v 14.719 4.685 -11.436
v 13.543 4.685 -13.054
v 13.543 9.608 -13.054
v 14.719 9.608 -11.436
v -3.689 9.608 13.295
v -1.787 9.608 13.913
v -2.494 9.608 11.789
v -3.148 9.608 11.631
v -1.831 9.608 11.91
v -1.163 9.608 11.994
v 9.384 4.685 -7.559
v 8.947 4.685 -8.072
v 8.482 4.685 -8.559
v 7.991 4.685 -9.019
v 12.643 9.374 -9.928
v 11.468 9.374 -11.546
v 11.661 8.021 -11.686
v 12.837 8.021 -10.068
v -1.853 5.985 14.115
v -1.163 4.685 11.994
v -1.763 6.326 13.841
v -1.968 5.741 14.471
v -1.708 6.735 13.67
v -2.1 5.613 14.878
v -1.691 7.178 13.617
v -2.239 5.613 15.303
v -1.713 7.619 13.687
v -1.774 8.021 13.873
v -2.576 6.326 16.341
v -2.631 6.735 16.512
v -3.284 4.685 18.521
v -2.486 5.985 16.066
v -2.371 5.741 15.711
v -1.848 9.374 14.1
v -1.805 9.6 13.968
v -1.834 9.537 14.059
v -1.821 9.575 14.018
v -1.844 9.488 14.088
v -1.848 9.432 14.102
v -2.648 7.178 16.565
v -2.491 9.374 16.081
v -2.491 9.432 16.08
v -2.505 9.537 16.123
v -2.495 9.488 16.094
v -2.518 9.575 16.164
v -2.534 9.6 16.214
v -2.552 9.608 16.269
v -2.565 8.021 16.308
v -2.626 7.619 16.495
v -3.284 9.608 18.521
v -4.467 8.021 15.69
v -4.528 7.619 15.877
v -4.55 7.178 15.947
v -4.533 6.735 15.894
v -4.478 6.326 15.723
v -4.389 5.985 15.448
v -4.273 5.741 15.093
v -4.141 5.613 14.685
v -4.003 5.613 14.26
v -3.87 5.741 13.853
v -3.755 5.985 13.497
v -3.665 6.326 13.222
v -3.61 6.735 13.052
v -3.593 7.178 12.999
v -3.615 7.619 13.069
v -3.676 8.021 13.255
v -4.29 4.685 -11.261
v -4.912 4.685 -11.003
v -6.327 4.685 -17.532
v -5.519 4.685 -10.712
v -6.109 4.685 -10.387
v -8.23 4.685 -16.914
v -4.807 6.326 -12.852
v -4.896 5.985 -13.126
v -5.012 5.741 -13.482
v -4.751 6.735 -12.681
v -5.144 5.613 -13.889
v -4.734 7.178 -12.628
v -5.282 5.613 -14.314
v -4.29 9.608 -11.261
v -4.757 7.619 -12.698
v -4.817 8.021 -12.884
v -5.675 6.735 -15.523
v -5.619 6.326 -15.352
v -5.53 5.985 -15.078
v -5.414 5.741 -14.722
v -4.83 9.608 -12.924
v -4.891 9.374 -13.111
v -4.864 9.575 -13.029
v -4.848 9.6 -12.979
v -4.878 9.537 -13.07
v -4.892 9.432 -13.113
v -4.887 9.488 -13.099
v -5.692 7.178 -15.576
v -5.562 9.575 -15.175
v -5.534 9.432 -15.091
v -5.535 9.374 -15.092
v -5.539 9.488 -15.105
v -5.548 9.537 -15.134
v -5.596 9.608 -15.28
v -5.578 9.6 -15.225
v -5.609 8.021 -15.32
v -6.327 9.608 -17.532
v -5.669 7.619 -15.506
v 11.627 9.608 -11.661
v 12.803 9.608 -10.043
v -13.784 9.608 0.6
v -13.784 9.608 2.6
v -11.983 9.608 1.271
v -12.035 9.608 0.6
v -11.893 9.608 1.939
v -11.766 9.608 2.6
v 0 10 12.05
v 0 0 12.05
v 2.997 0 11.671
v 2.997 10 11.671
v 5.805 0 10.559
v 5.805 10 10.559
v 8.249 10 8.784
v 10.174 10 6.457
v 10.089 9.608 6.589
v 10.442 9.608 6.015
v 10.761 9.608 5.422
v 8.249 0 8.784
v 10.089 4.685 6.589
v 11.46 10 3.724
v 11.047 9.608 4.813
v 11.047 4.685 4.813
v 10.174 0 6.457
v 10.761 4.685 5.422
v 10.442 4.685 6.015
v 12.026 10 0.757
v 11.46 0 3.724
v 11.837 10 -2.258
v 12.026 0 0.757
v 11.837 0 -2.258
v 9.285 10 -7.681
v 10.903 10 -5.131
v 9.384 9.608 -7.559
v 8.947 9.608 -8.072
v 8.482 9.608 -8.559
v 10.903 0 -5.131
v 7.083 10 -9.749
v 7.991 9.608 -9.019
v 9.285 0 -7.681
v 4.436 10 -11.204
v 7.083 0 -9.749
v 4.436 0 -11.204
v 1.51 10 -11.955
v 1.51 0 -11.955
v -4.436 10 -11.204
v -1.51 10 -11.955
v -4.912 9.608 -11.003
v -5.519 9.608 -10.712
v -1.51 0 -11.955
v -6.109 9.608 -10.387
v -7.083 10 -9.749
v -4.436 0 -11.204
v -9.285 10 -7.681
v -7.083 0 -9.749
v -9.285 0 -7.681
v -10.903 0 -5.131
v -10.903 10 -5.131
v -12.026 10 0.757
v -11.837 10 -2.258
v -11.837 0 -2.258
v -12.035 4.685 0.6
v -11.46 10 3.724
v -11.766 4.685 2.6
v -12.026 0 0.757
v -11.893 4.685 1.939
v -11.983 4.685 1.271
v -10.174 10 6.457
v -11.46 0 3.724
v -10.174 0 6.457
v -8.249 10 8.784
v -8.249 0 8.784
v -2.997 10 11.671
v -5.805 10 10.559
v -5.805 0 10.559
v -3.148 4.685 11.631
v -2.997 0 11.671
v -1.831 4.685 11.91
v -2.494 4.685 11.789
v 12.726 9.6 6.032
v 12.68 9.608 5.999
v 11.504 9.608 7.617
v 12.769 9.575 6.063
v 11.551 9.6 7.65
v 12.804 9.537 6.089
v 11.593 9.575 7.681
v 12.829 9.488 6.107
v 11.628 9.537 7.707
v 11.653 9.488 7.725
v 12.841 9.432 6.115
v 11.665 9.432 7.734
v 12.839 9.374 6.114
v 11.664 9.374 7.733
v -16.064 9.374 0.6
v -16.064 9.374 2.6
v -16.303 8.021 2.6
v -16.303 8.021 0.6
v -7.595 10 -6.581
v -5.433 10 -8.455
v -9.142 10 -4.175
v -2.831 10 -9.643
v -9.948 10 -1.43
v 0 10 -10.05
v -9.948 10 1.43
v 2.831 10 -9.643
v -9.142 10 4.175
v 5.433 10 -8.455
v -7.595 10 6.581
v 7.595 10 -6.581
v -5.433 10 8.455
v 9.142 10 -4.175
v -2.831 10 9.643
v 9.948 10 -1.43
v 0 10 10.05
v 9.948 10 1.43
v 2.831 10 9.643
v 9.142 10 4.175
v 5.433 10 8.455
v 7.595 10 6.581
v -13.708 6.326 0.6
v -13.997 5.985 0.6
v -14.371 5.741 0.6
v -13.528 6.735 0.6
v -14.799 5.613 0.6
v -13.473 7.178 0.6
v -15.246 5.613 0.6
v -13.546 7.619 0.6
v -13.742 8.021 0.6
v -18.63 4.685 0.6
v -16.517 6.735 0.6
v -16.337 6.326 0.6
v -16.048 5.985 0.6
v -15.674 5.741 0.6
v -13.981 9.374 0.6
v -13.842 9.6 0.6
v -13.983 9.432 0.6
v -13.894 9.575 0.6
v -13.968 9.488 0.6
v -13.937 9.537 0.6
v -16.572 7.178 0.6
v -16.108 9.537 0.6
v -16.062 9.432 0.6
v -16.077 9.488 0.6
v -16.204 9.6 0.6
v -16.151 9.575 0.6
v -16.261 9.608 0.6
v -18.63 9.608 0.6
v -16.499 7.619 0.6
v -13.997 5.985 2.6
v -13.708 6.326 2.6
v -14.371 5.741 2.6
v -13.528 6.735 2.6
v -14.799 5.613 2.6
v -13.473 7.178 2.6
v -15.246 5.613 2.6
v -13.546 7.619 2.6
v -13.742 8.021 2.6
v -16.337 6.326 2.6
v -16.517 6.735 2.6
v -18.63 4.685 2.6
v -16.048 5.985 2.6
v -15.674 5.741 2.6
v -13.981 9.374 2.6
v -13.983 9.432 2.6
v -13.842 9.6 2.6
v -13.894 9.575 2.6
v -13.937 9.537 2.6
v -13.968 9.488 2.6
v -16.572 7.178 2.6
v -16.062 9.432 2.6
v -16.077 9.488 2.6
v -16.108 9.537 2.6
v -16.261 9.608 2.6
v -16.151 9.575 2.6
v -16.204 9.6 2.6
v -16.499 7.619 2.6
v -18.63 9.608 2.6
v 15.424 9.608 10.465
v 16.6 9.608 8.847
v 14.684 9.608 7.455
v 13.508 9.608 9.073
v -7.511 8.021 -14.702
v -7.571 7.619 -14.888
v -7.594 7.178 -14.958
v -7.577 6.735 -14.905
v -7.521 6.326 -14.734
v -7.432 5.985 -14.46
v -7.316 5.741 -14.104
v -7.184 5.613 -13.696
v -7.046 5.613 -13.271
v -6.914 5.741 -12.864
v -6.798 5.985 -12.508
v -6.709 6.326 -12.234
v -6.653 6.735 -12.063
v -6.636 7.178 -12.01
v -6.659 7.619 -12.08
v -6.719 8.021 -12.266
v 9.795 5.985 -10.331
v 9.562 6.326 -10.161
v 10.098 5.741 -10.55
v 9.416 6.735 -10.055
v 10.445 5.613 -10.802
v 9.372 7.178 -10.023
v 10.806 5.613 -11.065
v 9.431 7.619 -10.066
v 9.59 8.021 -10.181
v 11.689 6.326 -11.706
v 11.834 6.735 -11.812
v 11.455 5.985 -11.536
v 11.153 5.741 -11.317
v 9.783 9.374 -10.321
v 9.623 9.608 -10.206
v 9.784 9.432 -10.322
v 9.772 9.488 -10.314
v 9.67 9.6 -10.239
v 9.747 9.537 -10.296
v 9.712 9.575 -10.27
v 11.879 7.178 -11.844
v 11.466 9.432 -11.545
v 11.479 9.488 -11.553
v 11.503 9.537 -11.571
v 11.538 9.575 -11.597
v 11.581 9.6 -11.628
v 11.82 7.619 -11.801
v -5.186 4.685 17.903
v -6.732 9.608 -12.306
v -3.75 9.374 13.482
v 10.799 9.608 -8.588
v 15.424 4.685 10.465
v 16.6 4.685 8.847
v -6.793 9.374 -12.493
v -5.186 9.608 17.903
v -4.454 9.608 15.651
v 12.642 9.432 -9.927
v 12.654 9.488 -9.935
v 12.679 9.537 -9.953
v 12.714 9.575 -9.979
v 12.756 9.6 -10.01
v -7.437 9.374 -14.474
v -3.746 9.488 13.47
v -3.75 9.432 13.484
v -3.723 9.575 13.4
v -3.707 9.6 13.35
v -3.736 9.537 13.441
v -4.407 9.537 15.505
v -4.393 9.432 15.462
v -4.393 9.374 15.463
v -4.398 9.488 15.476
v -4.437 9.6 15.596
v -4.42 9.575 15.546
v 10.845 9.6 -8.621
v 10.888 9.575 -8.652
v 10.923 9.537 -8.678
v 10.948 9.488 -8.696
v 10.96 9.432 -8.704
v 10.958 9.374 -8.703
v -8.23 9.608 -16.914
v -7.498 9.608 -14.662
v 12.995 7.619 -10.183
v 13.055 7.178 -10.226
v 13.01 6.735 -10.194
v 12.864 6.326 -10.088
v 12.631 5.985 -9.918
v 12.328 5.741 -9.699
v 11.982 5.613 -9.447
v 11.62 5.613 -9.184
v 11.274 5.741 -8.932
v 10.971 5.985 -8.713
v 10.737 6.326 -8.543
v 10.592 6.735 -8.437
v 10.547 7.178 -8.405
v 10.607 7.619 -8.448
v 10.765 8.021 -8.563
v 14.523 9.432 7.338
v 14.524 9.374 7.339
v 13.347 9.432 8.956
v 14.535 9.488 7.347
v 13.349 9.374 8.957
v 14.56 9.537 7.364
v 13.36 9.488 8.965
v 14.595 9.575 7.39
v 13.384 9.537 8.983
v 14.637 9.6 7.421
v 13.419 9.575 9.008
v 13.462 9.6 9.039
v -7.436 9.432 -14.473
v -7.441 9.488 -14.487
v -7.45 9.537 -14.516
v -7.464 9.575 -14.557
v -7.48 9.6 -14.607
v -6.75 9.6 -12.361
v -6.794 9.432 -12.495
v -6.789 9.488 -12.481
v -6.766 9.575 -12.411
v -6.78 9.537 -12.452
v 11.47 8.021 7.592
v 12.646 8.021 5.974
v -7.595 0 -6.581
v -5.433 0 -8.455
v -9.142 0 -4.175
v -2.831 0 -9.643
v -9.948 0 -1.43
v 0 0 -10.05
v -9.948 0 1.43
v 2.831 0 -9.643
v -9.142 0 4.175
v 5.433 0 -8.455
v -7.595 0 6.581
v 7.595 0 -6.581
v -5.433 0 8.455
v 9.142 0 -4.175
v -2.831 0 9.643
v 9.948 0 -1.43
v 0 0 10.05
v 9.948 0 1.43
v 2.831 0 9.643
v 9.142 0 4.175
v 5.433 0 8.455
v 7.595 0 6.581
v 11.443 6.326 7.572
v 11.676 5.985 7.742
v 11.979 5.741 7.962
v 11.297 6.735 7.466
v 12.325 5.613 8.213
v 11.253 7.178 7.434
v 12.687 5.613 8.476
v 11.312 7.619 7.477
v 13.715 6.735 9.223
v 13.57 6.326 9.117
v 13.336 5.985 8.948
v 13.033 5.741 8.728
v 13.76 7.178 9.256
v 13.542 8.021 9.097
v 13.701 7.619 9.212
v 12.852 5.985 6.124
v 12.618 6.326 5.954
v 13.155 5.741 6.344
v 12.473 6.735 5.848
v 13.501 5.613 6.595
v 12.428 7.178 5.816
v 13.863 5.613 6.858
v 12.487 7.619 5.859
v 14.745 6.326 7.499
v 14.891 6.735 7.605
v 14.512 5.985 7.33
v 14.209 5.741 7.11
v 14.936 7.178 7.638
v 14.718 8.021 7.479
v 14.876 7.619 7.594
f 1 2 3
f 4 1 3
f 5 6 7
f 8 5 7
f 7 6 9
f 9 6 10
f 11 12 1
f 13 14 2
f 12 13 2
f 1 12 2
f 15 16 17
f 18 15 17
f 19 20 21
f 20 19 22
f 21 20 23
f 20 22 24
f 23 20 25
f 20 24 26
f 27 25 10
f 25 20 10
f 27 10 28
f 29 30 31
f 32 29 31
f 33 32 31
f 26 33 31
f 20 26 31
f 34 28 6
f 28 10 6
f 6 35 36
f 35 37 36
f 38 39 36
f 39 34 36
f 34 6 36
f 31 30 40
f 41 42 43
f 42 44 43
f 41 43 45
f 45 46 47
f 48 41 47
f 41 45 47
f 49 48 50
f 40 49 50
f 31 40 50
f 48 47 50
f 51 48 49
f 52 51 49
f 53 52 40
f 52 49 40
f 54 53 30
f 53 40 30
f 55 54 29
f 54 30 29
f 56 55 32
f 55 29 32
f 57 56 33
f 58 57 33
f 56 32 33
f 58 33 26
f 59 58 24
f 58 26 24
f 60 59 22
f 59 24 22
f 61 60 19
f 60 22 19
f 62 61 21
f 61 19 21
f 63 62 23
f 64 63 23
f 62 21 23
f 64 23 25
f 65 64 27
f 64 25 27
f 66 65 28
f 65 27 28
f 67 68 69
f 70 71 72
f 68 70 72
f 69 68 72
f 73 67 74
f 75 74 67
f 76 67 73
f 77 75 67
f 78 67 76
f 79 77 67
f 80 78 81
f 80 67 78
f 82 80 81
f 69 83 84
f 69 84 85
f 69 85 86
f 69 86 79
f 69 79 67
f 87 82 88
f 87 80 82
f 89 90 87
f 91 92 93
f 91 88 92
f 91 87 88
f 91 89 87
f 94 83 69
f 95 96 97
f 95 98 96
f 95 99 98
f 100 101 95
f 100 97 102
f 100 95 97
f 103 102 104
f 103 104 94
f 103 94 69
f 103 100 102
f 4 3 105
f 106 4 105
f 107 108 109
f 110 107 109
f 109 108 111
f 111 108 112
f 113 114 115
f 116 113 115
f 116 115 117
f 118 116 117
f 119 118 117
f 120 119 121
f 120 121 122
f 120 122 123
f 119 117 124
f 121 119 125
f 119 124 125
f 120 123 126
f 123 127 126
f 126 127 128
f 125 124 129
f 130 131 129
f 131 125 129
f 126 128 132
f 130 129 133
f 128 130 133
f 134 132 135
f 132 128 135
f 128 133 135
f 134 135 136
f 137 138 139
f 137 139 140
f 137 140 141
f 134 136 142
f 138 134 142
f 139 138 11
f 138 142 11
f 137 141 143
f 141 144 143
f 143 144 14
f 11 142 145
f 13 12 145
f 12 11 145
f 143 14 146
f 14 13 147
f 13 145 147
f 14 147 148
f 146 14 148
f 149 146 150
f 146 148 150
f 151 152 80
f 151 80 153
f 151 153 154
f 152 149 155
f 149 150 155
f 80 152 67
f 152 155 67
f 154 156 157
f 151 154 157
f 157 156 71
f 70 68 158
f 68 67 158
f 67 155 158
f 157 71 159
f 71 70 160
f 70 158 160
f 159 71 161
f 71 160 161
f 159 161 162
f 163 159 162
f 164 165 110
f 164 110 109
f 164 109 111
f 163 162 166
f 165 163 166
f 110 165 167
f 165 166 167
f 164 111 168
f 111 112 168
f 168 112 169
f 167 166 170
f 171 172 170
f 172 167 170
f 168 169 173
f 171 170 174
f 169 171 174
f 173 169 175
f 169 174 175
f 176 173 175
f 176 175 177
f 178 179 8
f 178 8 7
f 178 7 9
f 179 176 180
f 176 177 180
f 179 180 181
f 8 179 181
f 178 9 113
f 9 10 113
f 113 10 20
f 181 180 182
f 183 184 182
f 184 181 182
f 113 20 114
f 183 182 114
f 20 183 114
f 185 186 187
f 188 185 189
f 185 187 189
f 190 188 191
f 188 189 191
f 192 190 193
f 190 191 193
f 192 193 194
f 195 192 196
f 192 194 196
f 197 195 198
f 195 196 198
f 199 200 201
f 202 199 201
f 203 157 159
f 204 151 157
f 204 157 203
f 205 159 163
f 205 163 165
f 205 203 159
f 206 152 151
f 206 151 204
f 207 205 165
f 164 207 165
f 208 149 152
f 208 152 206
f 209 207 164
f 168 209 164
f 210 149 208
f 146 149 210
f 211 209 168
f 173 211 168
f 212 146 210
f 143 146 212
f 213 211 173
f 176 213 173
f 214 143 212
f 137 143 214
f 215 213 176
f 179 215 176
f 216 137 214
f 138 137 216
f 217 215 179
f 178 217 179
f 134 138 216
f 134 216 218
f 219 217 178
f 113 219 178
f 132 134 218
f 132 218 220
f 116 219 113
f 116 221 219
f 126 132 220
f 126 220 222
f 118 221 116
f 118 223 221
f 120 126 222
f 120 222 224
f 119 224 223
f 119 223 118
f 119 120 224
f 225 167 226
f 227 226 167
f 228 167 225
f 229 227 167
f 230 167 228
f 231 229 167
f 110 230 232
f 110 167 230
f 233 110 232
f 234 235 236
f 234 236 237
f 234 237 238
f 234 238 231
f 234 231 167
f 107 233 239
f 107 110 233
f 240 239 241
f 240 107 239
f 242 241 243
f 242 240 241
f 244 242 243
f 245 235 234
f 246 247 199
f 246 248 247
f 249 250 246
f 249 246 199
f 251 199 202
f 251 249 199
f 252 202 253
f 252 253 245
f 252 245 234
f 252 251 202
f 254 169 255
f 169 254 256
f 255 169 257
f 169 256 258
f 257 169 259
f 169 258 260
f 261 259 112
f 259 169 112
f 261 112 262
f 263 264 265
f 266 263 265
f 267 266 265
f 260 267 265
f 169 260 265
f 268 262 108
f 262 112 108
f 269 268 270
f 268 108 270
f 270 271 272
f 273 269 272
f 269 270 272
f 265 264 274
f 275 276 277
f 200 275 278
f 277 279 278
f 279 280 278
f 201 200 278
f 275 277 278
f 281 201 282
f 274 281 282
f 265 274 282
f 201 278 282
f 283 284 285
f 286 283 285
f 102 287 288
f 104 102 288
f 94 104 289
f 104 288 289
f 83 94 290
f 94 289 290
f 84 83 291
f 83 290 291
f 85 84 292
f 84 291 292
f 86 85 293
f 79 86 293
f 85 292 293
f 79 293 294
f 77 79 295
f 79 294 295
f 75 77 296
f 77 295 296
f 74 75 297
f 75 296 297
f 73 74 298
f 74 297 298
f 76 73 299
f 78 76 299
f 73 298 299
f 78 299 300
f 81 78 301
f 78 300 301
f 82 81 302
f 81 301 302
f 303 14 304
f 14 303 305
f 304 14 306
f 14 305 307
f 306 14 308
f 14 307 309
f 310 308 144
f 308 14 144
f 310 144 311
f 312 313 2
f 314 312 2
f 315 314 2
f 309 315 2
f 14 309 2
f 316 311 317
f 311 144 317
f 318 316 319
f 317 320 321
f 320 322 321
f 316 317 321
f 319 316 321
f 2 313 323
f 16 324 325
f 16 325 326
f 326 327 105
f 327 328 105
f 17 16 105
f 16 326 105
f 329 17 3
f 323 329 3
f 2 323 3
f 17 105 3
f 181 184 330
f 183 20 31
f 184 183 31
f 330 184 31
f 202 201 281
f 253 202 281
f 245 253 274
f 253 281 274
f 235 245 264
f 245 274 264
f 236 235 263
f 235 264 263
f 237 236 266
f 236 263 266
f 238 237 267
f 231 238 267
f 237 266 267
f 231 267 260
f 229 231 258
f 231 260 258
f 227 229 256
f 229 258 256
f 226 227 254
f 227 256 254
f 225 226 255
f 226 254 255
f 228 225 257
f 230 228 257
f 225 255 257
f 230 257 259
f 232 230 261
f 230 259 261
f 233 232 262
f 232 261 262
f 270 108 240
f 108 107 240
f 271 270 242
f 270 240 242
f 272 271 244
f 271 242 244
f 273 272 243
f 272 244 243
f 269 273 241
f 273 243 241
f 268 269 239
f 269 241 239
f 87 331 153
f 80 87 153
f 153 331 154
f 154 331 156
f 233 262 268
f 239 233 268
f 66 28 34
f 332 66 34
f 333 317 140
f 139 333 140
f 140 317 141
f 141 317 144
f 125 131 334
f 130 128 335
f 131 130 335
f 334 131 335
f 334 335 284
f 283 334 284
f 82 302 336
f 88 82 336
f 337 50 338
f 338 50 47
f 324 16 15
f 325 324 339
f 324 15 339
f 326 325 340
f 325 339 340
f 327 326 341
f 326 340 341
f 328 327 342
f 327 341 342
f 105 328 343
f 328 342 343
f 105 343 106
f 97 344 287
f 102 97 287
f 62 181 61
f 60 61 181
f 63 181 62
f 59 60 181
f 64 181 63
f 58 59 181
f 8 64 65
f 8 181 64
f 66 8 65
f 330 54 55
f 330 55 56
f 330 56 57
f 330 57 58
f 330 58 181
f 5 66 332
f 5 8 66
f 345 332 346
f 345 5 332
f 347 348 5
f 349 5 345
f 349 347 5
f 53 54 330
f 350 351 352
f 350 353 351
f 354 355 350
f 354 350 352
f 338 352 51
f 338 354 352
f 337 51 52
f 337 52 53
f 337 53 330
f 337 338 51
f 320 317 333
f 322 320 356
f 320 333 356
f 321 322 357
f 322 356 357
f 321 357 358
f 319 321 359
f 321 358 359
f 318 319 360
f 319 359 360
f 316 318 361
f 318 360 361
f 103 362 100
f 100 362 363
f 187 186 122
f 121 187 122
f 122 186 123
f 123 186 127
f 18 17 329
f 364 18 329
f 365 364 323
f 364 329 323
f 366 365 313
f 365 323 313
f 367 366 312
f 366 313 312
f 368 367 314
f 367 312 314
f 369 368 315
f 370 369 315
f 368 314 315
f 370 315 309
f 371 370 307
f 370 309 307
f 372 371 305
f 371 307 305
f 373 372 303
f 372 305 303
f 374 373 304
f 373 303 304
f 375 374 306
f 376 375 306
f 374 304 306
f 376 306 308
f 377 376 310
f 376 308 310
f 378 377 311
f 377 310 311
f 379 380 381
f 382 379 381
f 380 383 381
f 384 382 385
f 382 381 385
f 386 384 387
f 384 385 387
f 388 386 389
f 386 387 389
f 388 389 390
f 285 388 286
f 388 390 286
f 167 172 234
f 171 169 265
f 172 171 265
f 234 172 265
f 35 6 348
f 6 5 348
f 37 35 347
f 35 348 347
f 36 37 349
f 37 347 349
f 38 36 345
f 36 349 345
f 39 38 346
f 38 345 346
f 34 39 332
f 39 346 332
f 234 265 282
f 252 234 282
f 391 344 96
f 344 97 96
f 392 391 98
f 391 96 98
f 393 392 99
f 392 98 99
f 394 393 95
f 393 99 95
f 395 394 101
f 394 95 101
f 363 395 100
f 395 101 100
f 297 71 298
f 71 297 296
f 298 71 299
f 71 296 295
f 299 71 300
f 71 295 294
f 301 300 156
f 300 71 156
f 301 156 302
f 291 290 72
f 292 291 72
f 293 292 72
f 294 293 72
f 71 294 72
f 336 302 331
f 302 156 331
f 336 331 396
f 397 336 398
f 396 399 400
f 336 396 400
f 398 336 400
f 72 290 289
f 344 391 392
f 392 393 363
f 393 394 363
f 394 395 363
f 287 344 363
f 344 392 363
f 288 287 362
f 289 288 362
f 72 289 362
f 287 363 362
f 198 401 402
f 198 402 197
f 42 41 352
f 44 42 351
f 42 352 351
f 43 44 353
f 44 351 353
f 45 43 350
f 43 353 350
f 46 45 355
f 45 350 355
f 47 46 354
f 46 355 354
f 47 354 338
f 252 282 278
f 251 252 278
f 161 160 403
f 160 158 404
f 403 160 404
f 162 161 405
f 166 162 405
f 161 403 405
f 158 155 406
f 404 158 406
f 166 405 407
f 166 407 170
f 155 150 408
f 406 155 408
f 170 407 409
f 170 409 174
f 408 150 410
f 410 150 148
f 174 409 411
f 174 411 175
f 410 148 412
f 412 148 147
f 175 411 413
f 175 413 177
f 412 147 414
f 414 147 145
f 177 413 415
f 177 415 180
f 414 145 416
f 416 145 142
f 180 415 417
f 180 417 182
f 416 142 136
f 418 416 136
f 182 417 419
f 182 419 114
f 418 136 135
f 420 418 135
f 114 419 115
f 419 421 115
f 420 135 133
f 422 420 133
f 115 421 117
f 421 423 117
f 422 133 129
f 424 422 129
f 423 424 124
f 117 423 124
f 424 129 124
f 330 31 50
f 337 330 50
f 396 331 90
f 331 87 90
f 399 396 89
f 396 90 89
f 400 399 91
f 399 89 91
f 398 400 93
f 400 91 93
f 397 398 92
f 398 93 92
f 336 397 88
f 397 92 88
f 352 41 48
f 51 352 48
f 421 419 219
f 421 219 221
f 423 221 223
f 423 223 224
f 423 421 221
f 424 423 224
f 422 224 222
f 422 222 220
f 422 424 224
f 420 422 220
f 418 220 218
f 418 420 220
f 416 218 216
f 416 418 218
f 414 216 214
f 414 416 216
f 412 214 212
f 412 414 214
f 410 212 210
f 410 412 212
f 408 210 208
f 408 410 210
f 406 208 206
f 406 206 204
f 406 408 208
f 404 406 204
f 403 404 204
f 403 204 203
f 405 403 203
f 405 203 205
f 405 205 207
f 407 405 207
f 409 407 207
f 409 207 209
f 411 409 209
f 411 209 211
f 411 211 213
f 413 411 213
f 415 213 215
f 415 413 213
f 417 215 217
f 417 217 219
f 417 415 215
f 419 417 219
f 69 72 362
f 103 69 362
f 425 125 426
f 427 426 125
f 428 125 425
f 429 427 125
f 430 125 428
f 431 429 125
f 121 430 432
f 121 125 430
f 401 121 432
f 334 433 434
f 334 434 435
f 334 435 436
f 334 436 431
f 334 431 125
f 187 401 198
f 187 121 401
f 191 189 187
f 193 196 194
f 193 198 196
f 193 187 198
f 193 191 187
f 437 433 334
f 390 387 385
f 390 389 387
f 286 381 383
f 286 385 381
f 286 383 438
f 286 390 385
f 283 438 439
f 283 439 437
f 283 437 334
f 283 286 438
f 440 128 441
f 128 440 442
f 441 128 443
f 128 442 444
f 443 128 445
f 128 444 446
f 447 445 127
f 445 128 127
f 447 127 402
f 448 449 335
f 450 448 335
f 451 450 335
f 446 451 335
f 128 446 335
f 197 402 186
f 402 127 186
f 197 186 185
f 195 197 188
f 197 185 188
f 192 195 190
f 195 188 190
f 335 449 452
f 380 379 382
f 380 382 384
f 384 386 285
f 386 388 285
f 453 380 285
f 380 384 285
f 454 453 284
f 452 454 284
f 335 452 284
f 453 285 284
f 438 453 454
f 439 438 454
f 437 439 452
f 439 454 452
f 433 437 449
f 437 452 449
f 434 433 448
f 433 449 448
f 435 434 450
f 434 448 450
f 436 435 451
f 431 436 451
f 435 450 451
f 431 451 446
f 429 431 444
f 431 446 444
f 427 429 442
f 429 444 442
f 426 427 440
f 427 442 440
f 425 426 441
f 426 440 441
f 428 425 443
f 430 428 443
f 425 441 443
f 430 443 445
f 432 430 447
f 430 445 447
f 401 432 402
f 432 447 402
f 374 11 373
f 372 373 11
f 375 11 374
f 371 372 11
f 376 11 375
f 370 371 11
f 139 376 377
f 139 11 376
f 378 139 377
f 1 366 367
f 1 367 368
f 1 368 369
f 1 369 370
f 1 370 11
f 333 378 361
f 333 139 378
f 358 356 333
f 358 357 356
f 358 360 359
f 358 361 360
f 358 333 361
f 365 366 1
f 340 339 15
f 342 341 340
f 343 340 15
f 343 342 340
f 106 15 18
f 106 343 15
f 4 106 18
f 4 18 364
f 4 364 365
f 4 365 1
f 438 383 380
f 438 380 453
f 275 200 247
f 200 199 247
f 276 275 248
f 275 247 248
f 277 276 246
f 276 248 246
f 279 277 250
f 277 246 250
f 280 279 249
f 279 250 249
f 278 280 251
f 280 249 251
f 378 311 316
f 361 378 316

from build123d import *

# Parameters (mm, degrees)
ESQUISSE1_R                      = 12.05
ESQUISSE1_R_2                    = 10.05
BASE_DEPTH                       = 10
BOSS_TIGE_DEPTH                  = 2
CONGE_TIGE_R                     = 0.2
REP_SUPPORT_TIGE_COUNT           = 5
CONGE_TIGE_OF_REP_SUPPORT_TIGE_R = 0.2


with BuildPart() as part:
    # Esquisse1 → BASE (new body)
    with BuildSketch(Plane(origin=(0, 0, 0), x_dir=(1, 0, 0), z_dir=(0, 1, 0))):
        Circle(ESQUISSE1_R)
        Circle(ESQUISSE1_R_2, mode=Mode.SUBTRACT)
    extrude(amount=BASE_DEPTH)

    # Esquisse7 → BOSS TIGE (add)
    with BuildSketch(Plane(origin=(0, 0, 2.6), x_dir=(-1, 0, 0), z_dir=(0, 0, -1))):
        with BuildLine():
            Line((14.022631891, 9.608391049), (11.415742159, 9.608391049))
            Line((11.415742159, 9.608391049), (11.415742159, 4.685414017))
            Line((11.415742159, 4.685414017), (18.629521623, 4.685414017))
            Line((18.629521623, 4.685414017), (18.629521623, 9.608391049))
            Line((18.629521623, 9.608391049), (16.022631891, 9.608391049))
            Line((16.022631891, 9.608391049), (16.302913172, 8.020618644))
            ThreePointArc((16.302913172, 8.020618644), (15.022631891, 5.596902533), (13.742350611, 8.020618644))
            Line((13.742350611, 8.020618644), (14.022631891, 9.608391049))
        make_face()
    boss_tige = extrude(amount=BOSS_TIGE_DEPTH)

    # CONGE TIGE
    conge_tige_edges = [part.edges().sort_by_distance(p)[0] for p in [
        (-16.022631891, 9.608391049, 1.6),
        (-14.022631891, 9.608391049, 1.6),
    ]]
    fillet(conge_tige_edges, radius=CONGE_TIGE_R)

    # REP SUPPORT TIGE: BOSS TIGE ×5 about axis
    rep_support_tige_axis = Axis((0, 10, 0), (0, -1, 0))
    for i in range(1, REP_SUPPORT_TIGE_COUNT):
        add(boss_tige.rotate(rep_support_tige_axis, i * 360 / REP_SUPPORT_TIGE_COUNT))

    # CONGE TIGE of REP SUPPORT TIGE
    conge_tige_of_rep_support_tige_edges = [part.edges().sort_by_distance(p)[0] for p in [
        (-6.472955975, 9.608391049, -14.744001277),
        (-5.854921986, 9.608391049, -12.841888245),
        (12.022125091, 9.608391049, -10.712293919),
        (10.404091102, 9.608391049, -9.536723415),
        (13.903037898, 9.608391049, 8.123439537),
        (12.285003909, 9.608391049, 6.947869033),
        (-3.429575123, 9.608391049, 15.732855659),
        (-2.811541134, 9.608391049, 13.830742627),
    ]]
    fillet(conge_tige_of_rep_support_tige_edges, radius=CONGE_TIGE_OF_REP_SUPPORT_TIGE_R)


solid = part.part
